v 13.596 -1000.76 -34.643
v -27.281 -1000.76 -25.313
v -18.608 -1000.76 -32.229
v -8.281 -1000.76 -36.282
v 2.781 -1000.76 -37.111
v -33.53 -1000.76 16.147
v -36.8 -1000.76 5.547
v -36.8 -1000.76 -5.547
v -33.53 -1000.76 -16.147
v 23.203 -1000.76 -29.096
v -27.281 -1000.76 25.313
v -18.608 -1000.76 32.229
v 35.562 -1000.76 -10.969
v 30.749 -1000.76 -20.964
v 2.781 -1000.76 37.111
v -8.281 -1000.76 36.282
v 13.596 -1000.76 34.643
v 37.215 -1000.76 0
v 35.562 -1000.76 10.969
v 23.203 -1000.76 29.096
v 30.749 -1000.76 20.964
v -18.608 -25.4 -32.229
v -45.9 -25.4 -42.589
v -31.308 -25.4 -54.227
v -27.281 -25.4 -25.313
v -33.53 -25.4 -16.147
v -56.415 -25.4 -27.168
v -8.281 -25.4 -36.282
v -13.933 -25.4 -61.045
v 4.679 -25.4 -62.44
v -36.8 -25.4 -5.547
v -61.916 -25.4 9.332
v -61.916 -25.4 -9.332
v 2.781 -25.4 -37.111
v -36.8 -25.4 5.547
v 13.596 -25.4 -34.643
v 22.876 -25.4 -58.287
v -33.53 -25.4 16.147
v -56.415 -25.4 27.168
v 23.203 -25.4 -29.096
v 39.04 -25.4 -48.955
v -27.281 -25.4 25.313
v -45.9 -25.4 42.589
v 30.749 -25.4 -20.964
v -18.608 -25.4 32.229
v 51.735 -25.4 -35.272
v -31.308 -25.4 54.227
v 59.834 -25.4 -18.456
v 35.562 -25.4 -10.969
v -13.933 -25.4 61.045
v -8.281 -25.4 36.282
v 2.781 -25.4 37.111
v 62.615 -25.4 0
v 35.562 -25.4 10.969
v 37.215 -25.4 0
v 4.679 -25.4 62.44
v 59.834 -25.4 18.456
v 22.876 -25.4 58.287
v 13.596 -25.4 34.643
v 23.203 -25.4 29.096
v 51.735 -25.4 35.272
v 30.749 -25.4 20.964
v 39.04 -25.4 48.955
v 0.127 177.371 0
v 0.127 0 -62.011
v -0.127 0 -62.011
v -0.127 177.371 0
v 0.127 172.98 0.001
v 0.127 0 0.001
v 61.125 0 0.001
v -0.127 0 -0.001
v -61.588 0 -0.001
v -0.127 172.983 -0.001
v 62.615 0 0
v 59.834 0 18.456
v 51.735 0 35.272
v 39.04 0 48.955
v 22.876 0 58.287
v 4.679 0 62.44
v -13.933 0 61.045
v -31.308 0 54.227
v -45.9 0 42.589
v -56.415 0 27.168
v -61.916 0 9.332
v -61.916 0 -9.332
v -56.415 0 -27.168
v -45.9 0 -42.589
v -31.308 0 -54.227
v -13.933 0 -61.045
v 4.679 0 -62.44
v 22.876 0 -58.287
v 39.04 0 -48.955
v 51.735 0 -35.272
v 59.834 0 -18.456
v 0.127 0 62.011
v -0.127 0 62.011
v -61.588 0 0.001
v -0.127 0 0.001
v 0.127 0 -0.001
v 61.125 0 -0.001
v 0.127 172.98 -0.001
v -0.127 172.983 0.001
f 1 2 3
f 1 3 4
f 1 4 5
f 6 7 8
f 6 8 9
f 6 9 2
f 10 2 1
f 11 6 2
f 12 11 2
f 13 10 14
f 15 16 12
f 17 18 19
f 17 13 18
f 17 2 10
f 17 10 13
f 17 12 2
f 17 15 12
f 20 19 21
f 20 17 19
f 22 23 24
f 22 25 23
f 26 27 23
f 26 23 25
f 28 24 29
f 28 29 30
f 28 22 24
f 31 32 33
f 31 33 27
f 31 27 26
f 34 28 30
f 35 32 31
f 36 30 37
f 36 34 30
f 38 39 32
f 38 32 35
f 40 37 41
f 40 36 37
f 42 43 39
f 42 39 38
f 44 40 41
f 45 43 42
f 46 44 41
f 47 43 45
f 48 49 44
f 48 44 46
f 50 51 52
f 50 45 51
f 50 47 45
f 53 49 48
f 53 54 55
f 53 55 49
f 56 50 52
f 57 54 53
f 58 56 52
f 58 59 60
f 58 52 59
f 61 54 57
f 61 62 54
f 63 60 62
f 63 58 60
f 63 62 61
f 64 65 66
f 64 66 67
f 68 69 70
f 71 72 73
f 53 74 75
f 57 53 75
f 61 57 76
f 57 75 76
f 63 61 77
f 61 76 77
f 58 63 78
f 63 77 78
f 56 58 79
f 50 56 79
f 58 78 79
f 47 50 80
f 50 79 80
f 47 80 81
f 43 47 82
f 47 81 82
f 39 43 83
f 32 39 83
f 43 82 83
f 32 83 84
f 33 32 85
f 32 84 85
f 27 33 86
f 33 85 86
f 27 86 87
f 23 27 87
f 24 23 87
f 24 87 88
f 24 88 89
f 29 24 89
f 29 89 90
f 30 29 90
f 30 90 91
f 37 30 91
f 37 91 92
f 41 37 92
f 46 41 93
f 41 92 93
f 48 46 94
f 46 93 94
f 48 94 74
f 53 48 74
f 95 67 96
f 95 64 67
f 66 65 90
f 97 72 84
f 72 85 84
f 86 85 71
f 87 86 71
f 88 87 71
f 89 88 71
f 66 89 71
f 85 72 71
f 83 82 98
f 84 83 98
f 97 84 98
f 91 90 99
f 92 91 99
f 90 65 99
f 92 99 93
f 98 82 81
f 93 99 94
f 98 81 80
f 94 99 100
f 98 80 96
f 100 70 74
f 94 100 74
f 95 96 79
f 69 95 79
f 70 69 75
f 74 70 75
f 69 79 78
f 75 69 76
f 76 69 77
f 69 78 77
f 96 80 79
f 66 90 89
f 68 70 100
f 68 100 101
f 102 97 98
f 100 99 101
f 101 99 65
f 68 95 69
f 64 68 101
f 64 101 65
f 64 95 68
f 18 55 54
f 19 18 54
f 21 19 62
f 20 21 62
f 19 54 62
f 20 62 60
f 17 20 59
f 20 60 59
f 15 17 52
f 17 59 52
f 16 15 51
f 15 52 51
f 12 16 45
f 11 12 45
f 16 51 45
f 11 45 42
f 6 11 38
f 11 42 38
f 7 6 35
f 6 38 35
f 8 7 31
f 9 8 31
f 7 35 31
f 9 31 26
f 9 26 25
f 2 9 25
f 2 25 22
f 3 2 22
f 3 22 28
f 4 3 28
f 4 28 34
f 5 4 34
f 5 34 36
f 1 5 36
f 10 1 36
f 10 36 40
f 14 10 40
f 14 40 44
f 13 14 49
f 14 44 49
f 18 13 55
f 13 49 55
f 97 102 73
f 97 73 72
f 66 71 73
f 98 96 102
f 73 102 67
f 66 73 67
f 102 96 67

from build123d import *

# Parameters (mm, degrees)
F0_R     = 62.61538
F1_DEPTH = 25.4
F4_DEPTH = 0.00127
F5_DEPTH = 0.127
F6_R     = 37.21538
F7_DEPTH = 975.36


with BuildPart() as f1:
    # F0 (on Front) → F1 (new body)
    with BuildSketch(Plane.XZ):
        Circle(F0_R)
    extrude(amount=F1_DEPTH)

    # F3 (on Top) → F4 (join, symmetric)
    with BuildSketch(Plane.XY):
        Polygon((61.124925, 0), (0, 173.340619), (0, 0), align=None)
        Polygon((0, 0), (0, 173.340619), (-61.587557, 0), align=None)
    extrude(amount=F4_DEPTH, both=True)

    # F2 (on Right) → F5 (join, symmetric)
    with BuildSketch(Plane.YZ):
        Polygon((0, 62.011465), (0, 0), (177.370593, 0), align=None)
        Polygon((177.370593, 0), (0, 0), (0, -62.011465), align=None)
    extrude(amount=F5_DEPTH, both=True)

    # F6 (on face) → F7 (join)
    with BuildSketch(Plane.XZ.offset(25.4)):
        Circle(F6_R)
    extrude(amount=F7_DEPTH)


solid = f1.part
